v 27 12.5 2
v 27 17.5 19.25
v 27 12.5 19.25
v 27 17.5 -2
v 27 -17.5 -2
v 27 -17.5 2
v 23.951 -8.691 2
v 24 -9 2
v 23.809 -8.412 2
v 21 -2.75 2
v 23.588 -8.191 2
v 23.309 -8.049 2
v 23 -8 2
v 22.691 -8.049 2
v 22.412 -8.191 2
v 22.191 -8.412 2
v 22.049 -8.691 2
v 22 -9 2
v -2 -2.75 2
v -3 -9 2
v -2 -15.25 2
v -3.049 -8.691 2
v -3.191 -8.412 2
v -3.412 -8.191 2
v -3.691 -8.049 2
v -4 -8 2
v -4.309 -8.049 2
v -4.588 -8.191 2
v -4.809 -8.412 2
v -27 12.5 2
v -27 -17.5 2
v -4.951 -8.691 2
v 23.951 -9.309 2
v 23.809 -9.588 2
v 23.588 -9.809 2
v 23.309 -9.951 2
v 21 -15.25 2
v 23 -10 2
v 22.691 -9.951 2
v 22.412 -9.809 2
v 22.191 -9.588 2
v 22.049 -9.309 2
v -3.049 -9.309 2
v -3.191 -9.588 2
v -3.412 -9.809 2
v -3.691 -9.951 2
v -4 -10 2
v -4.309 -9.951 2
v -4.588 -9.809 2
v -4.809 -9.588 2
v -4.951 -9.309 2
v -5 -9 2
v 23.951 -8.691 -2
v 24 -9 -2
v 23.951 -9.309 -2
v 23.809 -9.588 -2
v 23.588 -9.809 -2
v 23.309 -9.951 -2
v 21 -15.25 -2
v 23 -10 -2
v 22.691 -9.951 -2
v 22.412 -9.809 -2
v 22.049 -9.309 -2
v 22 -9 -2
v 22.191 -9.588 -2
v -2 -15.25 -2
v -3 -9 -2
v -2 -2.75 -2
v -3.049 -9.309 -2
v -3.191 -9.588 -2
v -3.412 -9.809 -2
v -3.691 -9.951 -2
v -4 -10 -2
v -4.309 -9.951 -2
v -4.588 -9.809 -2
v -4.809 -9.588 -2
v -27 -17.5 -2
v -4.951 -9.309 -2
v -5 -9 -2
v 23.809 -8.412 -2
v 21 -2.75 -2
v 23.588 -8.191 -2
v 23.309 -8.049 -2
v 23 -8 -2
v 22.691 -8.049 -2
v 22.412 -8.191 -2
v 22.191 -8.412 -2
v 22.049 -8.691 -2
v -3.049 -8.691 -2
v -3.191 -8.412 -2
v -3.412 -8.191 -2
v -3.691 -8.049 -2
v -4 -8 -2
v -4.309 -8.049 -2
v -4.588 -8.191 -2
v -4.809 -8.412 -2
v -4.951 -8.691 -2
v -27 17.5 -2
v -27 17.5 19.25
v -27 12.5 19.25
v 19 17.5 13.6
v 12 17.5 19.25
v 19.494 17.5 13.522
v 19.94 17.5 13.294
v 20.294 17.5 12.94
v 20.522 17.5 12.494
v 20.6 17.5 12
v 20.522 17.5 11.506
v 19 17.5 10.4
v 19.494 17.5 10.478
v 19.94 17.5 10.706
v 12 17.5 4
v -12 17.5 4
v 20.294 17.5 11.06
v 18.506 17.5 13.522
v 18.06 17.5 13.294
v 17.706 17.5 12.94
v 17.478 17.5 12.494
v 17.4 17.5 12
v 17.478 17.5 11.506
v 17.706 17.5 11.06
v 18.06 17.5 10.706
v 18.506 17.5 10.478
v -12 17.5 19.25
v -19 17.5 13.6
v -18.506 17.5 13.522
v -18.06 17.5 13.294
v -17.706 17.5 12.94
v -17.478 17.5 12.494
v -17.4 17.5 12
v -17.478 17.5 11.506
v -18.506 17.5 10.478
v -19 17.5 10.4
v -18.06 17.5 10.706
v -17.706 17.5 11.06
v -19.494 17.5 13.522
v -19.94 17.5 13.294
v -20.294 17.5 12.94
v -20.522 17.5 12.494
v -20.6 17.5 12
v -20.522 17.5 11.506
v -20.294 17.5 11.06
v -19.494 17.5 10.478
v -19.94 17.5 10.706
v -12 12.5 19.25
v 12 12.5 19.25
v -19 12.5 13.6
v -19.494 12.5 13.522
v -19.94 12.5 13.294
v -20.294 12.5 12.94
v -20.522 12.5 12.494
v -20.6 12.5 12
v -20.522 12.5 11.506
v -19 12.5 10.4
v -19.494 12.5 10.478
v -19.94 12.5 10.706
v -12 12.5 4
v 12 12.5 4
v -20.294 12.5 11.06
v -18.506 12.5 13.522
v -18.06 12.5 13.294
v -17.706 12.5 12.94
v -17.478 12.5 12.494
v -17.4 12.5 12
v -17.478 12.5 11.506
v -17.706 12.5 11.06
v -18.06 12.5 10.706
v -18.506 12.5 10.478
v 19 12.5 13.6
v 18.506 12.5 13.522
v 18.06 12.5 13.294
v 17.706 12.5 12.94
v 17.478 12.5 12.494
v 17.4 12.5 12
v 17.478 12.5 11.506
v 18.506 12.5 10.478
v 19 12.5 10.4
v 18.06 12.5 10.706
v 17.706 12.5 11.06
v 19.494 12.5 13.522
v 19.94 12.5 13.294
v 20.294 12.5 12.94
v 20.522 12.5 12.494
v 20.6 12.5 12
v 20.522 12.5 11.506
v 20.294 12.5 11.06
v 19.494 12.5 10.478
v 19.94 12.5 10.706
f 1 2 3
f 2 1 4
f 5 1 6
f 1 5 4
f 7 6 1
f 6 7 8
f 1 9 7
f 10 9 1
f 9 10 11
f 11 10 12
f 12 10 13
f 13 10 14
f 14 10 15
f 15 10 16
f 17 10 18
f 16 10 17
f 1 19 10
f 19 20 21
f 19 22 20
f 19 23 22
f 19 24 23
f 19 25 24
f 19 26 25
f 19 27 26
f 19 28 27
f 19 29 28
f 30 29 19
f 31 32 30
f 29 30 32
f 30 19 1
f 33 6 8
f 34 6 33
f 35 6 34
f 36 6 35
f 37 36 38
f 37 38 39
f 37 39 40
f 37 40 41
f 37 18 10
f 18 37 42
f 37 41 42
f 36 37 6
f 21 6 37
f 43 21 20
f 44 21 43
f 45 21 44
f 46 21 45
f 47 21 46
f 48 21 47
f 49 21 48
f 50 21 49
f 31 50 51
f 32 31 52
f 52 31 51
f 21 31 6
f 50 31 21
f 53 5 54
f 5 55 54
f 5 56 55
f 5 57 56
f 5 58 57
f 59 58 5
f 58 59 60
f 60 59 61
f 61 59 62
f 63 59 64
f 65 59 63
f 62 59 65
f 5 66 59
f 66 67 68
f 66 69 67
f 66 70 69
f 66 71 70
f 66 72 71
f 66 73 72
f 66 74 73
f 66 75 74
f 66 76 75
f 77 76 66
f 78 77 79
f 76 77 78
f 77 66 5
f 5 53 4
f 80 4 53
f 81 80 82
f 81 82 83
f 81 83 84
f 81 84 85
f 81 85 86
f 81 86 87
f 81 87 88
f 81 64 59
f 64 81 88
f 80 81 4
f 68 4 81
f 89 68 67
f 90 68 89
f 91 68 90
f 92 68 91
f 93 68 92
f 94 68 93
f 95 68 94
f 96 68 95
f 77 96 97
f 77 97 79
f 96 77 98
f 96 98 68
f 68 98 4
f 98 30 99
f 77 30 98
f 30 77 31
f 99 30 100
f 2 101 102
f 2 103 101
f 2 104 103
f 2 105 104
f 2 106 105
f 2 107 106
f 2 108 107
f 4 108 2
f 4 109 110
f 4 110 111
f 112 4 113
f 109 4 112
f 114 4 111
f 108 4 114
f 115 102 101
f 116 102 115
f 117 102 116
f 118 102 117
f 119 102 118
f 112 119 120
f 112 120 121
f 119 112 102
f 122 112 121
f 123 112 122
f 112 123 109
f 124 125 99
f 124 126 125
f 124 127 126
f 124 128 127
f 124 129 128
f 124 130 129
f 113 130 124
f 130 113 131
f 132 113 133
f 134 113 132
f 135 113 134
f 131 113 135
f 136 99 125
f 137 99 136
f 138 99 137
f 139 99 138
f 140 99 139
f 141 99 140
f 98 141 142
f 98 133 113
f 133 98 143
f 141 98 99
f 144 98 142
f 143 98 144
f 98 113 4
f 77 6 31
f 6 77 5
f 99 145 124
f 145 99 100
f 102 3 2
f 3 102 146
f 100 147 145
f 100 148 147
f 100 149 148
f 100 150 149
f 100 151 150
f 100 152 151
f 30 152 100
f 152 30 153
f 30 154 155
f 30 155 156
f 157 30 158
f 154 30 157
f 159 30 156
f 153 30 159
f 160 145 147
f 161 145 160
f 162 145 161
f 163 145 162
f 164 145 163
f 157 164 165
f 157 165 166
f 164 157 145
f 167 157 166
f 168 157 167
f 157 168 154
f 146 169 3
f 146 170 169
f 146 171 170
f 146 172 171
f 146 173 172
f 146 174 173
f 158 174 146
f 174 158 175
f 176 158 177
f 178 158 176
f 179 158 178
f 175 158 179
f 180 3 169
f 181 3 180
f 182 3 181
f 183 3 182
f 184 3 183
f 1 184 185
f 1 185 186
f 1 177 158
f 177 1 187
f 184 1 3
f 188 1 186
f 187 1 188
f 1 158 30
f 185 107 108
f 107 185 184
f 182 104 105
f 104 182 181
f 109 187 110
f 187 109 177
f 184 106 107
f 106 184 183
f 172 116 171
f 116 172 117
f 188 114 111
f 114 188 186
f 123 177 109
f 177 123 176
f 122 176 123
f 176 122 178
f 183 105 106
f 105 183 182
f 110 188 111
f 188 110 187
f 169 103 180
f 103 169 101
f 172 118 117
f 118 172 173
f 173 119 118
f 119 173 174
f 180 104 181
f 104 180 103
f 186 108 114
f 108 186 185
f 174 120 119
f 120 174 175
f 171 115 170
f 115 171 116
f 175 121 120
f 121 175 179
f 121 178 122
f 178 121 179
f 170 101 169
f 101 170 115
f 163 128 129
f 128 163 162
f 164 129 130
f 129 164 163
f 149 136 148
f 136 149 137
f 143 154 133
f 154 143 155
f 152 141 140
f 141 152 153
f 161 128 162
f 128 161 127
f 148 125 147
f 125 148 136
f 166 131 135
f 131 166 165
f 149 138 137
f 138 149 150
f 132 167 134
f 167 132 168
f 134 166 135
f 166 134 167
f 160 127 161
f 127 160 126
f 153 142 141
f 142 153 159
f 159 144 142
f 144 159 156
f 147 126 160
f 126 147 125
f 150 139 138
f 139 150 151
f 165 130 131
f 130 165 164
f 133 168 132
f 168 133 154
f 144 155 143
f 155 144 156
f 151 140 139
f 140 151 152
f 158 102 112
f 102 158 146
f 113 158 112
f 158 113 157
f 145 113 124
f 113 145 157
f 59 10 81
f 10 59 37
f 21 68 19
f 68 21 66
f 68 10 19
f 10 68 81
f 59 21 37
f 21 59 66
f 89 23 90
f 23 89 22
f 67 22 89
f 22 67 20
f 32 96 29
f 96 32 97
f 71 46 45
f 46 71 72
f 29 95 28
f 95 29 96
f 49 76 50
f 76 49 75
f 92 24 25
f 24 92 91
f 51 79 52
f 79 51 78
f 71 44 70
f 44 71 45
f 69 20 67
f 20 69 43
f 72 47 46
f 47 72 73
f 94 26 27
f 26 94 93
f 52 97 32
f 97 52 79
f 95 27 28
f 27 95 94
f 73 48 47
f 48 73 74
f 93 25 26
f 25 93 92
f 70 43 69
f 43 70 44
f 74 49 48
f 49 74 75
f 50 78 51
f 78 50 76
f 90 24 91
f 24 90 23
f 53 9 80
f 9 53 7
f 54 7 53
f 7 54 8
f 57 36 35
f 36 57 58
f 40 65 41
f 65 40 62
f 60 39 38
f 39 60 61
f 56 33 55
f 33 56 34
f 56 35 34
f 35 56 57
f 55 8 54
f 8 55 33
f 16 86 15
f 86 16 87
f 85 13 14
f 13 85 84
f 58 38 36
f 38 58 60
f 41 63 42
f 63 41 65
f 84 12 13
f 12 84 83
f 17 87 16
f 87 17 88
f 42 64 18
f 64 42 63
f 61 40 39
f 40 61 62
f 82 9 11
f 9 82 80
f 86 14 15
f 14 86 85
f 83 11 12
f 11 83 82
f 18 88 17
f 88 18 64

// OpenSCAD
//Author: Piotr Paterek, Kraków 05-08.2016
$fn=20;
module base()
{
    cube([54,35,4], center=true);
    translate([0,15,10.5])
    {   
        cube([54,5,17.5], center=true);
    }
}

difference()
        {
    difference()
            {
        difference()
            {
            difference()
            {
                difference()
                {
                    difference()
                    {
                        base();
                        translate([19,15,12])
                        {
                            rotate(a=90,v=[1,0,0])
                            {
                                cylinder(r=1.6, h=5, center=true);
                            }
                        }
                    }
                translate([-19,15,12])
                    {
                        rotate(a=90,v=[1,0,0])
                        {
                            cylinder(r=1.6, h=5, center=true);
                        }
                    }
                }
            translate([0,15,17])
                {   
                    cube([24,5,26], center=true);
                }
            }
        translate([9.5,-9,0])
        {
            cube([23,12.5,4], center=true);
        }
        }
    translate([-4,-9,0])
    {
        cylinder(r=1, h=4, center=true);
    }
    }
translate([23,-9,0])
{
    cylinder(r=1, h=4, center=true);
}
}
